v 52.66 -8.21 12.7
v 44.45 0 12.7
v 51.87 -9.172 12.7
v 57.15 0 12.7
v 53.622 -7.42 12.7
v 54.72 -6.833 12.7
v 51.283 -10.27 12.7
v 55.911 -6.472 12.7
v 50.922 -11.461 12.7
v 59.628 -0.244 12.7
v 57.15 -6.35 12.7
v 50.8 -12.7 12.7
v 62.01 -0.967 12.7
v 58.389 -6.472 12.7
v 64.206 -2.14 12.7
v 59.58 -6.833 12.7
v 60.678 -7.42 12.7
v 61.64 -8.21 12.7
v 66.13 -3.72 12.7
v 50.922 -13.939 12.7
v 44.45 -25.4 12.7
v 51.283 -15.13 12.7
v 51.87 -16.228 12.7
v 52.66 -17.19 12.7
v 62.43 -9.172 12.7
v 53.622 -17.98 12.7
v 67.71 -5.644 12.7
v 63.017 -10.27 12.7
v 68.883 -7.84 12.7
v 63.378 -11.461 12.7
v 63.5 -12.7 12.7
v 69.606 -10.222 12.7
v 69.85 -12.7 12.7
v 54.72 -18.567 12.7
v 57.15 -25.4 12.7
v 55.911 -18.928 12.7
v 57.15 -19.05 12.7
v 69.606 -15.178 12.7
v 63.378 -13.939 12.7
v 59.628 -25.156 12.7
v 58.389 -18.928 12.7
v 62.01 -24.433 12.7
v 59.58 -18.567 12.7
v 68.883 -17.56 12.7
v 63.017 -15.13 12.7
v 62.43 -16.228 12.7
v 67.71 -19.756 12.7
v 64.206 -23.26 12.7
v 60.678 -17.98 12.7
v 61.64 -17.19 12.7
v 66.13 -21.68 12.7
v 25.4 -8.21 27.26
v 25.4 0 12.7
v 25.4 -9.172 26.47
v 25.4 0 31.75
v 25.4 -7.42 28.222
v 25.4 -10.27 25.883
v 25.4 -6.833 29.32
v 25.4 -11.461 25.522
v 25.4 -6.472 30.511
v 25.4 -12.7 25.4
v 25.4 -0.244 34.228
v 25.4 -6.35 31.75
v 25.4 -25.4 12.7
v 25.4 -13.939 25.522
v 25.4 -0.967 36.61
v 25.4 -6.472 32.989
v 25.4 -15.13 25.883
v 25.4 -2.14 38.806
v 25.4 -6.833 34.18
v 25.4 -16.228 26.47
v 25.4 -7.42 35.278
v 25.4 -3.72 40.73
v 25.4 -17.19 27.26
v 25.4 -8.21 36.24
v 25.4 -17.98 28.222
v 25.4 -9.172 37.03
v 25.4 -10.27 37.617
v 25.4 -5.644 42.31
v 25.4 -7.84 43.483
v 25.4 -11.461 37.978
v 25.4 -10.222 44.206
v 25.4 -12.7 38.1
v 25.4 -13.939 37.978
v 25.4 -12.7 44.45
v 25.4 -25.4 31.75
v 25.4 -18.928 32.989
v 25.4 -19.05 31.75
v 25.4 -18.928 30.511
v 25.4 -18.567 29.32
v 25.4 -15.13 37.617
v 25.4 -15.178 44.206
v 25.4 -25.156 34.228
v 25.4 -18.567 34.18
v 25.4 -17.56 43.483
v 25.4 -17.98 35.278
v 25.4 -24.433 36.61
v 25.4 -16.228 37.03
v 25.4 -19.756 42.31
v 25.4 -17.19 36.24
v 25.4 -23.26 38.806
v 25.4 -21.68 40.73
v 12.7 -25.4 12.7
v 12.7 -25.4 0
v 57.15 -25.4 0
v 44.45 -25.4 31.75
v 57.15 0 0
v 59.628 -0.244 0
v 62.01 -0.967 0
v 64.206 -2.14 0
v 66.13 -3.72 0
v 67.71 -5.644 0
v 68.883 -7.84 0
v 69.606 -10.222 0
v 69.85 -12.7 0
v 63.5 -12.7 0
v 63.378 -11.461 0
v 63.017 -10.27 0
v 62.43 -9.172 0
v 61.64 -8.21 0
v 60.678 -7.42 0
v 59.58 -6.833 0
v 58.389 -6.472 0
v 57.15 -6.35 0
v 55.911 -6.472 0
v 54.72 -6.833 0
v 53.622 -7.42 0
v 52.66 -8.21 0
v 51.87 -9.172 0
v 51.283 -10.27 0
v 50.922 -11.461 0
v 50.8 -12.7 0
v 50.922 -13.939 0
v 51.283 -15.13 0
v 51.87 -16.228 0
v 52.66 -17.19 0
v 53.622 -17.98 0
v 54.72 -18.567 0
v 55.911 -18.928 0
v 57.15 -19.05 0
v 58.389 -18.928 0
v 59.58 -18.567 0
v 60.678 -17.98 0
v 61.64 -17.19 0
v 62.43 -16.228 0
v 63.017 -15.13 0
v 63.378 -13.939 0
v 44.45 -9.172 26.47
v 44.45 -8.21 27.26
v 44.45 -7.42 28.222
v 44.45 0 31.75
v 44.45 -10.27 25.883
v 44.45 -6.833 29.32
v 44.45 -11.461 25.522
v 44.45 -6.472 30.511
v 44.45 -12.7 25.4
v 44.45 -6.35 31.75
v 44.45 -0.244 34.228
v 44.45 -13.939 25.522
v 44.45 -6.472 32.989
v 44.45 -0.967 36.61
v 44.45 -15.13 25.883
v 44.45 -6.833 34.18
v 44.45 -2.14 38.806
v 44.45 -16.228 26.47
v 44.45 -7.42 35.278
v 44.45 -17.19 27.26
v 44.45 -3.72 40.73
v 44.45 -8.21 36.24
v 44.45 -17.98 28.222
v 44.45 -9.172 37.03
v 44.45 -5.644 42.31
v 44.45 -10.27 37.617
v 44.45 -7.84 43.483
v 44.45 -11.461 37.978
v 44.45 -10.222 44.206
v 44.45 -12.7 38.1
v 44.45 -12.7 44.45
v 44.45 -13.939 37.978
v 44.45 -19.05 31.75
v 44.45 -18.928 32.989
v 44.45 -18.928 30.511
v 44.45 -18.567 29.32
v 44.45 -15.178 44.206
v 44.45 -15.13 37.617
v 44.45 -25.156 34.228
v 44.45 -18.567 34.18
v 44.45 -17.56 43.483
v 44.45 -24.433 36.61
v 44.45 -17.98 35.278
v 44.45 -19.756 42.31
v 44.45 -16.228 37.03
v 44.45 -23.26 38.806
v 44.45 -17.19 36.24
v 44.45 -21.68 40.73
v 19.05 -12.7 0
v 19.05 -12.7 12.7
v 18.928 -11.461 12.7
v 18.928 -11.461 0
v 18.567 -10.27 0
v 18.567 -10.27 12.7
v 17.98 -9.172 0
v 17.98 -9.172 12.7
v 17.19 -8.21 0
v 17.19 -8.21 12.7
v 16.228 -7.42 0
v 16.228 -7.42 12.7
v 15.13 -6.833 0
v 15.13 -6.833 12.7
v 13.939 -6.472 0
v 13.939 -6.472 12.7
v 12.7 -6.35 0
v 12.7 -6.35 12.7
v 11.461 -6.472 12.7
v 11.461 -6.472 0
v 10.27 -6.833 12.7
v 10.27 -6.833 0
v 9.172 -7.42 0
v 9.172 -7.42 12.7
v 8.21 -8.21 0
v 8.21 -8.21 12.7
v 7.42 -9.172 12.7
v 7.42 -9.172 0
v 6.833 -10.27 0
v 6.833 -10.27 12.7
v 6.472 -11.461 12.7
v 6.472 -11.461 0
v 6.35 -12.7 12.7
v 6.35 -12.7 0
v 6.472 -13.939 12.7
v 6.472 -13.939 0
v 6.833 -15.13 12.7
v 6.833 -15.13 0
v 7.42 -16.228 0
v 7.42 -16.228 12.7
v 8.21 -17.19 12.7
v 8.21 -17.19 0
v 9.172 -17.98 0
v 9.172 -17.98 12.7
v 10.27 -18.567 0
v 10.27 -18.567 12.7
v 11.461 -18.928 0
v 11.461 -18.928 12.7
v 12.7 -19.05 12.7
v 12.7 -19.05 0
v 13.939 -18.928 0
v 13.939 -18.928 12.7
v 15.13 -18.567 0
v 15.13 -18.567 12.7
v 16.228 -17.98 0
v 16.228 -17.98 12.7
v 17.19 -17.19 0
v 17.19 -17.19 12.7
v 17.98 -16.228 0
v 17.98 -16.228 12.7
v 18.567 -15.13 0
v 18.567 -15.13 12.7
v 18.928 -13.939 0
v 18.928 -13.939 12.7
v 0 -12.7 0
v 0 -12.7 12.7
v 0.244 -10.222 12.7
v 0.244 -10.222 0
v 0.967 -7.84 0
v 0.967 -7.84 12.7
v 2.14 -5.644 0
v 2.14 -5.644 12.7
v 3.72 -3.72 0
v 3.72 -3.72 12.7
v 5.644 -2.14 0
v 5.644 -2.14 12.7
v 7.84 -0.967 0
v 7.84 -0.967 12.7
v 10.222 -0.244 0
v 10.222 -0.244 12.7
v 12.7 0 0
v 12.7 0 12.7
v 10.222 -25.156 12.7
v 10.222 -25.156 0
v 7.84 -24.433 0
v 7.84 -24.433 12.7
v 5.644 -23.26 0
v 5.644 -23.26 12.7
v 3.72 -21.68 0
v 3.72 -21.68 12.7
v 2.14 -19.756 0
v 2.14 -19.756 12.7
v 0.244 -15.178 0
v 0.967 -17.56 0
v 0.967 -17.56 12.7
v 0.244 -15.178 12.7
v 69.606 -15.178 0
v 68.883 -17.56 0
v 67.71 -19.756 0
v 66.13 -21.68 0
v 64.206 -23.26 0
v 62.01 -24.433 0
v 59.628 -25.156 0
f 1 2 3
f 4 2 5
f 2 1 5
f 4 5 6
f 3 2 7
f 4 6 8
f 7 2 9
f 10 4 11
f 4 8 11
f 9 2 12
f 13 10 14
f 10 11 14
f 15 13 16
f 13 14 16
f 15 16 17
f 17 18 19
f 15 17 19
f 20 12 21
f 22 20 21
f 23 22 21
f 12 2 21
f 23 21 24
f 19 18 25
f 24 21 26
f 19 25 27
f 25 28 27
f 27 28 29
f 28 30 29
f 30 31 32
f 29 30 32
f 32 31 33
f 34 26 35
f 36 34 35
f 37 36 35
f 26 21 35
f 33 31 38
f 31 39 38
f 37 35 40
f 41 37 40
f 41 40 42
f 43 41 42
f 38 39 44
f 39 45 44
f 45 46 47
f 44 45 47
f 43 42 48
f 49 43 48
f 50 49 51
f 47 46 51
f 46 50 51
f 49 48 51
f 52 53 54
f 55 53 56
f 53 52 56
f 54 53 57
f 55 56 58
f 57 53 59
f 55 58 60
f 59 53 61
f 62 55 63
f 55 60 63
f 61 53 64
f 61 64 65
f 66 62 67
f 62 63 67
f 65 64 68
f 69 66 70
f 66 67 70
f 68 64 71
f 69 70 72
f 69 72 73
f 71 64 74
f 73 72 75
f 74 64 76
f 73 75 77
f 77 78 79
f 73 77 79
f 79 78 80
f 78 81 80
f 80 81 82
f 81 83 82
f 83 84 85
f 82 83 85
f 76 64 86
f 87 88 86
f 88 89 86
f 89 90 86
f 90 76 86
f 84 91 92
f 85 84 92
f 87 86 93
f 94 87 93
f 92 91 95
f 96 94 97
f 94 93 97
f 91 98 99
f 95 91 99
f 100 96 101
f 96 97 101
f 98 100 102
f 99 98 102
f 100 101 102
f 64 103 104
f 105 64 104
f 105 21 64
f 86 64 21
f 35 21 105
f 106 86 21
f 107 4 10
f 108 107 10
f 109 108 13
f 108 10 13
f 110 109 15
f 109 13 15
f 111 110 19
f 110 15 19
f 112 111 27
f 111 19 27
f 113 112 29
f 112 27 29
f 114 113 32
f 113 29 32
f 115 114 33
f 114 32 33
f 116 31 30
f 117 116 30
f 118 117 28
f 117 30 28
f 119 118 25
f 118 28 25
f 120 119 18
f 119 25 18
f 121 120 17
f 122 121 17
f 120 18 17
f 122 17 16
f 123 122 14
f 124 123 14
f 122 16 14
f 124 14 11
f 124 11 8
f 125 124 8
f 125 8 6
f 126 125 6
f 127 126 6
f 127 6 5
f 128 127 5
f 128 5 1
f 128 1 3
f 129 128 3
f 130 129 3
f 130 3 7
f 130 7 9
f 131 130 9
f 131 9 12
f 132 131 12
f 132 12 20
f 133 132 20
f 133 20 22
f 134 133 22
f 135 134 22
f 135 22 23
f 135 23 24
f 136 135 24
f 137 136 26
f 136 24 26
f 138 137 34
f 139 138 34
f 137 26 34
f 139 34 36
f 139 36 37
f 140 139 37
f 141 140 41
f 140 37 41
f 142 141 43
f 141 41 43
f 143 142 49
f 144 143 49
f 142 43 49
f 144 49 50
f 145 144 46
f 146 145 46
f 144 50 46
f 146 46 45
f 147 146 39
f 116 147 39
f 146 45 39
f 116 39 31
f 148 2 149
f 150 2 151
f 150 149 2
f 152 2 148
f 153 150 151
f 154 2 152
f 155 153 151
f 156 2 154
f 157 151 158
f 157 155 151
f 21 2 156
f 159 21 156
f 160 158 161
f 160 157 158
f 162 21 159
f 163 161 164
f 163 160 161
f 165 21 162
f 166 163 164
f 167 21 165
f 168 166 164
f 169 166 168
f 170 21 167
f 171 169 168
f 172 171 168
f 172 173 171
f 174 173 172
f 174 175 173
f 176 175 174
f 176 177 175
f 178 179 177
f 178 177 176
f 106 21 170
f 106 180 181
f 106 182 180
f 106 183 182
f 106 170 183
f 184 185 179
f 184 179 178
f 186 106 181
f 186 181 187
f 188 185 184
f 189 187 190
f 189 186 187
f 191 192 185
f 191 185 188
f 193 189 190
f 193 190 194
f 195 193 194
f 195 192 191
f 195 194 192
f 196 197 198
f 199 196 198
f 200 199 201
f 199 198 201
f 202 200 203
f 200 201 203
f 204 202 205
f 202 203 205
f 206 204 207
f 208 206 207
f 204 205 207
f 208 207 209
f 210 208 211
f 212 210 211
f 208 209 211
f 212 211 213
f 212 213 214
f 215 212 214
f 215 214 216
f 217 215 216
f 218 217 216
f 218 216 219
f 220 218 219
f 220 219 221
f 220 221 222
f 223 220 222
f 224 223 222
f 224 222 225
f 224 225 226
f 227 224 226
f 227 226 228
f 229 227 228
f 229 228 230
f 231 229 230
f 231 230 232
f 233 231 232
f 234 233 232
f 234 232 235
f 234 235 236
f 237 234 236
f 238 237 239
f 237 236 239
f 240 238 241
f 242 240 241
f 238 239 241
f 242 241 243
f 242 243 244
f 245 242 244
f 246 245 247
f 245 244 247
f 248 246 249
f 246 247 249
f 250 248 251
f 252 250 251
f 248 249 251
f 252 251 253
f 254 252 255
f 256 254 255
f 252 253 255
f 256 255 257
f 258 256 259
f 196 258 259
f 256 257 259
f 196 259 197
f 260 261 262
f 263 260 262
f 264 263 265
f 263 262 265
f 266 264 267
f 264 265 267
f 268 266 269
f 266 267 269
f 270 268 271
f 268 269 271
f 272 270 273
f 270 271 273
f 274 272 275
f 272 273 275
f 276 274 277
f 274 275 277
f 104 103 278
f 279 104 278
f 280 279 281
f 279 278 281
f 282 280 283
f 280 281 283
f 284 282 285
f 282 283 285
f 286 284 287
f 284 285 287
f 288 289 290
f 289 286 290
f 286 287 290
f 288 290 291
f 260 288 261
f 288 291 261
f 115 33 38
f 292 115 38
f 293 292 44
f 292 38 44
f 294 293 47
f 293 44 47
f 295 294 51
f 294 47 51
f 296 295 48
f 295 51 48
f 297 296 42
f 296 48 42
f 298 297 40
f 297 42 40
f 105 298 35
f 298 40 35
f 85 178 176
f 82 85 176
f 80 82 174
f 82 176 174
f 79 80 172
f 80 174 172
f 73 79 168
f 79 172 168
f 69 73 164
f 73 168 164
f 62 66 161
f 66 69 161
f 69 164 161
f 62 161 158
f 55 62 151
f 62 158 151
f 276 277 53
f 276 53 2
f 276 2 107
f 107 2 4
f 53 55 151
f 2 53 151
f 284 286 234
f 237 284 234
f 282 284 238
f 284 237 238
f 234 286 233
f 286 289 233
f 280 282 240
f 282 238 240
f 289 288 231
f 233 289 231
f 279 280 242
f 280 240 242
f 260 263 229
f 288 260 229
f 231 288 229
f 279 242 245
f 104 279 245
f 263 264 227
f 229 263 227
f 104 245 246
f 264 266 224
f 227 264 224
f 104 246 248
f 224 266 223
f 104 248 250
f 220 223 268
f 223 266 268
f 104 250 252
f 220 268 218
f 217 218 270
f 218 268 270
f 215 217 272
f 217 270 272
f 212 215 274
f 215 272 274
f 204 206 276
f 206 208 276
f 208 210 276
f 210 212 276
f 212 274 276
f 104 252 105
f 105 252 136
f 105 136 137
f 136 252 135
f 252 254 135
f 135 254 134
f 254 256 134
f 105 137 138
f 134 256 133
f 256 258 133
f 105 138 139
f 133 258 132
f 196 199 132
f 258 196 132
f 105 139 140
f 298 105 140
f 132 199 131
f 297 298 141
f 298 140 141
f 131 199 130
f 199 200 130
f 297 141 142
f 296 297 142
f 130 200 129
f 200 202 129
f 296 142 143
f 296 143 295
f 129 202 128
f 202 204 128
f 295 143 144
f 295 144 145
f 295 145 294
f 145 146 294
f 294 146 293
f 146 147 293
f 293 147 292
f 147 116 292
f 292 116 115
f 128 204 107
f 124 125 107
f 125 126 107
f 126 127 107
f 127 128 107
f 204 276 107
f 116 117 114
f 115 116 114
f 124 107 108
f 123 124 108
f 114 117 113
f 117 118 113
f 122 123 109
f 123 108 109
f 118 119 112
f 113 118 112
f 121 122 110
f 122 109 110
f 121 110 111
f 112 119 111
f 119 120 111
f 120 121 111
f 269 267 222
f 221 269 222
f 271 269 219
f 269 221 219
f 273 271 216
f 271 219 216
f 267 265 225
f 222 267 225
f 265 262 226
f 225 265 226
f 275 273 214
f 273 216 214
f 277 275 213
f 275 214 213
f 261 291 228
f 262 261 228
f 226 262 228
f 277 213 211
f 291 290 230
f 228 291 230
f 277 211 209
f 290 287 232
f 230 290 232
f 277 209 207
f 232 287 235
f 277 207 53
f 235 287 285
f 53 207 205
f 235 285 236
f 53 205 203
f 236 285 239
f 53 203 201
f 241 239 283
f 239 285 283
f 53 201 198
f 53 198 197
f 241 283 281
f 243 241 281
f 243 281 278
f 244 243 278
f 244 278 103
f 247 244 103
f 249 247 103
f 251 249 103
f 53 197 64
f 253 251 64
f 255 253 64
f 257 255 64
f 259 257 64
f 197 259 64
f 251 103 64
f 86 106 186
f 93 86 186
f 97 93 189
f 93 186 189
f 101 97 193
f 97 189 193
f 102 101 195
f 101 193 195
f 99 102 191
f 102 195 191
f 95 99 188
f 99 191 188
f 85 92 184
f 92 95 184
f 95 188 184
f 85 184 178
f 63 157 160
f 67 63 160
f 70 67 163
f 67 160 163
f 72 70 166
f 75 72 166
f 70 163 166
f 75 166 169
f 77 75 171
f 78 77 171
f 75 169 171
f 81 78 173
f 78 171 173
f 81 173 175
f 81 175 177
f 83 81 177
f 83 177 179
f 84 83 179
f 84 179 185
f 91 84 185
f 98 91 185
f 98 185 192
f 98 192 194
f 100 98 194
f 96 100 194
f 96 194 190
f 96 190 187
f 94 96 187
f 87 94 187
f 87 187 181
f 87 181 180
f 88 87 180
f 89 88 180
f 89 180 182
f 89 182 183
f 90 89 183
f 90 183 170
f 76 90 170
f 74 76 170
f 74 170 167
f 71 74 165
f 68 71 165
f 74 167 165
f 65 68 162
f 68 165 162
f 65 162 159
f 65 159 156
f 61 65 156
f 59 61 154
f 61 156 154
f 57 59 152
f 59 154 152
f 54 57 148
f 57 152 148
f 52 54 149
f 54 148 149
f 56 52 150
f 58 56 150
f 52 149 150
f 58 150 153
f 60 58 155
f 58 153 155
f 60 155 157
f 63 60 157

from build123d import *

# Parameters (mm, degrees)
F0_W      = 69.85
F0_H      = 44.45
F1_DEPTH  = 25.4
F2_W      = 25.4
F2_H      = 31.75
F3_DEPTH  = 25.4
F5_DEPTH  = 25.4
F6_R      = 6.35
F7_DEPTH  = 25.4
F9_DEPTH  = 25.4
F11_DEPTH = 25.4
F12_R     = 6.35
F13_DEPTH = 25.4


with BuildPart() as f1:
    # F0 (on Front) → F1 (new body)
    with BuildSketch(Plane.XZ):
        with Locations((34.925, 22.225)):
            Rectangle(F0_W, F0_H)
    extrude(amount=F1_DEPTH)

    # F2 (on face) → F3 (cut)
    with BuildSketch(Plane.XZ.offset(25.4)):
        with Locations((12.7, 28.575)):
            Rectangle(F2_W, F2_H)
        with Locations((57.15, 28.575)):
            Rectangle(F2_W, F2_H)
    extrude(amount=-F3_DEPTH, mode=Mode.SUBTRACT)

    # F4 (on face) → F5 (cut)
    with BuildSketch(Plane.YZ.offset(44.45)):
        with BuildLine():
            ThreePointArc((-25.4, 31.750001), (-21.680256, 40.730257), (-12.7, 44.45))
            Line((-12.7, 44.45), (-25.4, 44.45))
            Line((-25.4, 44.45), (-25.4, 31.750001))
        make_face()
        with BuildLine():
            ThreePointArc((-12.7, 44.45), (-3.719744, 40.730256), (0, 31.75))
            Line((0, 31.75), (0, 44.45))
            Line((0, 44.45), (-12.7, 44.45))
        make_face()
    extrude(amount=-F5_DEPTH, mode=Mode.SUBTRACT)

    # F6 (on face) → F7 (cut)
    with BuildSketch(Plane.YZ.offset(44.45)):
        with Locations((-12.7, 31.75)):
            Circle(F6_R)
    extrude(amount=-F7_DEPTH, mode=Mode.SUBTRACT)

    # F8 (on face) → F9 (cut)
    with BuildSketch(Plane.XY.offset(12.7)):
        with BuildLine():
            ThreePointArc((57.15, 0), (66.130256, -3.719744), (69.85, -12.7))
            Line((69.85, -12.7), (69.85, 0))
            Line((69.85, 0), (57.15, 0))
        make_face()
        with BuildLine():
            ThreePointArc((69.85, -12.7), (66.130256, -21.680256), (57.15, -25.4))
            Line((57.15, -25.4), (69.85, -25.4))
            Line((69.85, -25.4), (69.85, -12.7))
        make_face()
    extrude(amount=-F9_DEPTH, mode=Mode.SUBTRACT)

    # F10 (on face) → F11 (cut)
    with BuildSketch(Plane.XY.offset(12.7)):
        with BuildLine():
            ThreePointArc((0, -12.7), (3.719744, -3.719744), (12.7, 0))
            Line((12.7, 0), (0, 0))
            Line((0, 0), (0, -12.7))
        make_face()
        with BuildLine():
            ThreePointArc((12.7, -25.4), (3.719744, -21.680256), (0, -12.7))
            Line((0, -12.7), (0, -25.4))
            Line((0, -25.4), (12.7, -25.4))
        make_face()
    extrude(amount=-F11_DEPTH, mode=Mode.SUBTRACT)

    # F12 (on face) → F13 (cut)
    with BuildSketch(Plane.XY.offset(12.7)):
        with Locations((12.7, -12.7)):
            Circle(F12_R)
        with Locations((57.15, -12.7)):
            Circle(F12_R)
    extrude(amount=-F13_DEPTH, mode=Mode.SUBTRACT)


solid = f1.part
